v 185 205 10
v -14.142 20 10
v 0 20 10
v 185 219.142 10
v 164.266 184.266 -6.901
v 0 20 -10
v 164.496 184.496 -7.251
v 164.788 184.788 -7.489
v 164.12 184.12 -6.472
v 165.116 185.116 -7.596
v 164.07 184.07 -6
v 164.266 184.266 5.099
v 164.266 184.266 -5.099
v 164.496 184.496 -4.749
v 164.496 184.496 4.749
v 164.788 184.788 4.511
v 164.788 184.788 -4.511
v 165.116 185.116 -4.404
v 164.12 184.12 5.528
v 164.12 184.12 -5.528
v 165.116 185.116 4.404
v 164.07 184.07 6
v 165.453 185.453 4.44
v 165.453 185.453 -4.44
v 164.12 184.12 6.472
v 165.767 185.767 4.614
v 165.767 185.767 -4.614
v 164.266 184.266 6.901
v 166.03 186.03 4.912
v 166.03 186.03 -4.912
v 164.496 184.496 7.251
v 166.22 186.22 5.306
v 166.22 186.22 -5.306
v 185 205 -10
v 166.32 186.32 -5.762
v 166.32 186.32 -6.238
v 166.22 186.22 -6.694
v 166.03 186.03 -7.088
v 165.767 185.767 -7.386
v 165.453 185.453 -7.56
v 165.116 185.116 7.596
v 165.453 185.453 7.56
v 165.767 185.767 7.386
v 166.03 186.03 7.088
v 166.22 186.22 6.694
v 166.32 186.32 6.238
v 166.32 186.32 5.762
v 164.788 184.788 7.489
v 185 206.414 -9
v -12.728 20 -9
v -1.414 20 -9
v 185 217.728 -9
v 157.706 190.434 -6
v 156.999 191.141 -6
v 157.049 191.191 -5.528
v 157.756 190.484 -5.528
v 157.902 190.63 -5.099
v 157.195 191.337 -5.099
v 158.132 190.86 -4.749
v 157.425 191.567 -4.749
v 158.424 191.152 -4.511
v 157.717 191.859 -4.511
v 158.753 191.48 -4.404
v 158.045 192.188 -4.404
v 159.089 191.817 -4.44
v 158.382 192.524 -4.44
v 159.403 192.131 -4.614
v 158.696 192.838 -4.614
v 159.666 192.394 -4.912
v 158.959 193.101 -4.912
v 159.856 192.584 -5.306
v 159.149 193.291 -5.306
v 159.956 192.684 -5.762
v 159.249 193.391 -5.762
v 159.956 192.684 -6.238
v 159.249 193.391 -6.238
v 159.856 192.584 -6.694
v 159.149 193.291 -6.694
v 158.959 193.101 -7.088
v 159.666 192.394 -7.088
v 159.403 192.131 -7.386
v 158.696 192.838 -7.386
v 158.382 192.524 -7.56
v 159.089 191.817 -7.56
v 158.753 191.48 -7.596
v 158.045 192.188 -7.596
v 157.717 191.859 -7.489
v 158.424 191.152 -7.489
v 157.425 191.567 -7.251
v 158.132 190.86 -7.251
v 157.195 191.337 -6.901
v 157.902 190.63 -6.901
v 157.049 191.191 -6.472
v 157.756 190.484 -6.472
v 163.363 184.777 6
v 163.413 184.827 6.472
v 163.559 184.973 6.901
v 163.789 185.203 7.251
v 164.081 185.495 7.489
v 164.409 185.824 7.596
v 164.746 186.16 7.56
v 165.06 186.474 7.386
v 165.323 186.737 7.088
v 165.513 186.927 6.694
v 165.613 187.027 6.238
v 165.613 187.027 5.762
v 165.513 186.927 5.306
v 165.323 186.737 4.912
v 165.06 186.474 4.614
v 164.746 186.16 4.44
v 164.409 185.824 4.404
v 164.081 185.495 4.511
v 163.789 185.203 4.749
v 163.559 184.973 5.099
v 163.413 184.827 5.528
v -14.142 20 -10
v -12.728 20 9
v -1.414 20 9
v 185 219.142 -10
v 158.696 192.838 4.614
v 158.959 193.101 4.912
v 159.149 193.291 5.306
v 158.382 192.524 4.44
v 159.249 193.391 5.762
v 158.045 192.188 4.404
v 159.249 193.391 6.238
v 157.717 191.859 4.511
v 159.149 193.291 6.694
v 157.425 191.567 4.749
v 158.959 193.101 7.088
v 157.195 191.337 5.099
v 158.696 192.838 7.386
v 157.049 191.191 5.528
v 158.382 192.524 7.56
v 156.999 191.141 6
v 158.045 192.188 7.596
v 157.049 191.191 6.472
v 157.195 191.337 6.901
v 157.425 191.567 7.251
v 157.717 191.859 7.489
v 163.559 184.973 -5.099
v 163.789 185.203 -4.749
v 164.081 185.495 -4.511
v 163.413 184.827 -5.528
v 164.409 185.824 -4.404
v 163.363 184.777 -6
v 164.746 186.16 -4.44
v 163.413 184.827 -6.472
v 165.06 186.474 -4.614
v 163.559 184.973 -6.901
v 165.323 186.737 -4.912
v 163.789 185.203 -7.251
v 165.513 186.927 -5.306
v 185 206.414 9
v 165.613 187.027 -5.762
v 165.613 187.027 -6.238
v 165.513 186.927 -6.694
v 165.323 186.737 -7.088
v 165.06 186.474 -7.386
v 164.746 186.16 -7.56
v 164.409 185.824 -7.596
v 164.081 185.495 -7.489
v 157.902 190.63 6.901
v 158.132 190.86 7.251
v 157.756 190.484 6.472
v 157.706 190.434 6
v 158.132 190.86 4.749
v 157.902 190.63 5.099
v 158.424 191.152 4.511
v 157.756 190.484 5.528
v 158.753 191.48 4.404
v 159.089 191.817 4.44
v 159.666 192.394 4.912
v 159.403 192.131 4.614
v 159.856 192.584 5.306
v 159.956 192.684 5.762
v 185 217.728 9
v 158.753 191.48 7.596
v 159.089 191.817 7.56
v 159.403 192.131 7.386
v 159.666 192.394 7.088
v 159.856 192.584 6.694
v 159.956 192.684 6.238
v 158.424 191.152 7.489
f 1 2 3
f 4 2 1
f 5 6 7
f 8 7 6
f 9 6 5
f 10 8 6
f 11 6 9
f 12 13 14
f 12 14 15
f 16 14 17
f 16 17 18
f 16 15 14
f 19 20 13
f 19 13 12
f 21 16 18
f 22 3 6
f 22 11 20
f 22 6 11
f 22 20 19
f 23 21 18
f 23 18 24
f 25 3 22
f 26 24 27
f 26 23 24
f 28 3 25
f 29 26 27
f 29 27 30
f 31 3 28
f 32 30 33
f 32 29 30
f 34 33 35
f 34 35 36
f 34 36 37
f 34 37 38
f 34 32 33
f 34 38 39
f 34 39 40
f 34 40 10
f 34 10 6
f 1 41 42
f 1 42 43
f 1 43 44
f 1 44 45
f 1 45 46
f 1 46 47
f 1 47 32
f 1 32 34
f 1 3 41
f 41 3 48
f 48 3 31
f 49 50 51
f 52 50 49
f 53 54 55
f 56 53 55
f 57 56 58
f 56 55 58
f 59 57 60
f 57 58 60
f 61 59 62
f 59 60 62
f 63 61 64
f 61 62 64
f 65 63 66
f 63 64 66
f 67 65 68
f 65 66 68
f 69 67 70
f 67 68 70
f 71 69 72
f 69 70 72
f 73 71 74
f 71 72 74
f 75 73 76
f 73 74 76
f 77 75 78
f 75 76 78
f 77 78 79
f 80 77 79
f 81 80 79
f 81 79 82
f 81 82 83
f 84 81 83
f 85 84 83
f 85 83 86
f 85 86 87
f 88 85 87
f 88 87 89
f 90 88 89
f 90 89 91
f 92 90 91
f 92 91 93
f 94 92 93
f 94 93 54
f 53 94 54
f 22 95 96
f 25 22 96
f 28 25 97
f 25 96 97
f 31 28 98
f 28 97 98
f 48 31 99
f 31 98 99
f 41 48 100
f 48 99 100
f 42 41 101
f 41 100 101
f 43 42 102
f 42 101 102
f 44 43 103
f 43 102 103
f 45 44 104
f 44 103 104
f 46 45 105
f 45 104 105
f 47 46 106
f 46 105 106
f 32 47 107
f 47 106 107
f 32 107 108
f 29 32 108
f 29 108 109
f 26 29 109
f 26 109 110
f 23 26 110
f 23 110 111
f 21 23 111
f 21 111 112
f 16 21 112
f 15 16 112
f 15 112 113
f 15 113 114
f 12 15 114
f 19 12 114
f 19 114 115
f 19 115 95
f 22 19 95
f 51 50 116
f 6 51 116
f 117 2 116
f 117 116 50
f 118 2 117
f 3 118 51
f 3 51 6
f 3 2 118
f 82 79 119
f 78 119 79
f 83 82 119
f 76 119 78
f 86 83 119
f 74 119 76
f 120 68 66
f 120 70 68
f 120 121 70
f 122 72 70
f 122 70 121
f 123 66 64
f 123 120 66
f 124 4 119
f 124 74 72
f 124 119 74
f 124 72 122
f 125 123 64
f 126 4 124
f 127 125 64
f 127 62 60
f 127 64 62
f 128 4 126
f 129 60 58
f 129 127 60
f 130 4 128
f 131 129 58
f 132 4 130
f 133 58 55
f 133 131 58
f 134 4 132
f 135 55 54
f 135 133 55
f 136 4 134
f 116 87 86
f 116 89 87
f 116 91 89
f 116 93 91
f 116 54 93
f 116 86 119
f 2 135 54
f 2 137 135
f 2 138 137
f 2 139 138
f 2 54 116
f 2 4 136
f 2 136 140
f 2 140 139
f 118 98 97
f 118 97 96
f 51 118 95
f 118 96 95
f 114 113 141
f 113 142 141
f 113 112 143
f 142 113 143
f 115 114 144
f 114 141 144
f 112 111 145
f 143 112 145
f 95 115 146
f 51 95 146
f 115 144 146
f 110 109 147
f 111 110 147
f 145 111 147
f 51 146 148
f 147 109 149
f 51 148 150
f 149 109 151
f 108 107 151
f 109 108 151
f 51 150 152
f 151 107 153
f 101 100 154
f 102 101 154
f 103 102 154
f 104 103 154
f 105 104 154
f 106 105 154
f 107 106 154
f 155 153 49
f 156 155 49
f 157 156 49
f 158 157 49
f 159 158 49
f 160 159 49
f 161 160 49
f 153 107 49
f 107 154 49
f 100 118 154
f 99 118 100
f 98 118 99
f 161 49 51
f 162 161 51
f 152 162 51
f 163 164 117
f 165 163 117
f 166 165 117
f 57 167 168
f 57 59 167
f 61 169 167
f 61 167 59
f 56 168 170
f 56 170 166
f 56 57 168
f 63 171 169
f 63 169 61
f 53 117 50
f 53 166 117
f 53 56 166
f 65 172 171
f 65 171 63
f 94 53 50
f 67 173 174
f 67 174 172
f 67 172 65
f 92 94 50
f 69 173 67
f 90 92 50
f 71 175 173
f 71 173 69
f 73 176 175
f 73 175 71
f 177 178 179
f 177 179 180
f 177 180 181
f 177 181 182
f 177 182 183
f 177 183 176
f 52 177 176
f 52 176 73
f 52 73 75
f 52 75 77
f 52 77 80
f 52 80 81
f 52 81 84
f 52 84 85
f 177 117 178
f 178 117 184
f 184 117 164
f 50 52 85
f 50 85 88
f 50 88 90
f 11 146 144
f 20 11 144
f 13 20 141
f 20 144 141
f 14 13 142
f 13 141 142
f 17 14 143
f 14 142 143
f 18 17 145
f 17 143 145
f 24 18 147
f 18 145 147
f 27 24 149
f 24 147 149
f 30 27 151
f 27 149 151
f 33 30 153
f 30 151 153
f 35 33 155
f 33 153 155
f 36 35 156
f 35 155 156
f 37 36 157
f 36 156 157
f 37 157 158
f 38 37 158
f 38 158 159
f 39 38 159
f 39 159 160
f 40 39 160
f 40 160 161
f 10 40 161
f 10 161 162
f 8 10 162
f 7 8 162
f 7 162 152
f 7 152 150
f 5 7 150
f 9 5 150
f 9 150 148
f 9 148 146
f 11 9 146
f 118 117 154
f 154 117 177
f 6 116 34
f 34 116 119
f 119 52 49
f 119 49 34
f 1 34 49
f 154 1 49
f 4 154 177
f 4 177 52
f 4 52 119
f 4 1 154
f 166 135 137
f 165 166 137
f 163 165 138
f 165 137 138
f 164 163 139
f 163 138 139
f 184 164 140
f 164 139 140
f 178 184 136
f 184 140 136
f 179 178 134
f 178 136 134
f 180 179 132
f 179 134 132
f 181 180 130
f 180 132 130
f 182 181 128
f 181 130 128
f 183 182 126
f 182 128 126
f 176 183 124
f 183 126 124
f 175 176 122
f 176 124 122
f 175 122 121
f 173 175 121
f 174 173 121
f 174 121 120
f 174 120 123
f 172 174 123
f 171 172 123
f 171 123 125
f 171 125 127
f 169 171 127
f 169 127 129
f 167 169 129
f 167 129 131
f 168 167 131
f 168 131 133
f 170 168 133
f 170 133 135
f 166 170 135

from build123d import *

# Parameters (mm, degrees)
EXTRUDE_1_DEPTH          = 10
CUT_EXTRUDE_1_DEPTH      = 273.883551892
CUT_EXTRUDE_1_DEPTH_BACK = 273.883551892
SKETCH_2_W               = 18
SKETCH_2_H               = 8
SKETCH_3_R               = 1.6
CUT_EXTRUDE_2_DEPTH      = 286.946556009


with BuildPart() as part:
    # 草图1 → 凸台-拉伸1 (new, symmetric)
    with BuildSketch(Plane.XY):
        Polygon((0, 20), (185, 205), (185, 219.142135624), (-14.142135624, 20), align=None)
    extrude(amount=EXTRUDE_1_DEPTH, both=True)

    # 草图2 → 切除-拉伸1 (cut, two sides: drawn at the far end of the back side and taken through both)
    with BuildSketch(Plane(origin=(10, 10, 0), x_dir=(0, 0, -1), z_dir=(-0.7071067811865462, -0.7071067811865489, 0)).offset(-CUT_EXTRUDE_1_DEPTH_BACK)):
        with Locations((0, -19.142135624)):
            Rectangle(SKETCH_2_W, SKETCH_2_H)
    extrude(amount=CUT_EXTRUDE_1_DEPTH + CUT_EXTRUDE_1_DEPTH_BACK, mode=Mode.SUBTRACT)

    # 草图3 → 切除-拉伸2 (cut, through all)
    with BuildSketch(Plane(origin=(-17.071067812, 17.071067812, 0), x_dir=(0.7071067811865462, 0.707106781186549, 0), z_dir=(-0.707106781186549, 0.7071067811865462, 0))):
        with Locations(Location((247.771644663, 6, 0), (0, 0, 180))):
            Circle(SKETCH_3_R)
        with Locations(Location((247.771644663, -6, 0), (0, 0, 180))):
            Circle(SKETCH_3_R)
    extrude(amount=-CUT_EXTRUDE_2_DEPTH, mode=Mode.SUBTRACT)


solid = part.part
